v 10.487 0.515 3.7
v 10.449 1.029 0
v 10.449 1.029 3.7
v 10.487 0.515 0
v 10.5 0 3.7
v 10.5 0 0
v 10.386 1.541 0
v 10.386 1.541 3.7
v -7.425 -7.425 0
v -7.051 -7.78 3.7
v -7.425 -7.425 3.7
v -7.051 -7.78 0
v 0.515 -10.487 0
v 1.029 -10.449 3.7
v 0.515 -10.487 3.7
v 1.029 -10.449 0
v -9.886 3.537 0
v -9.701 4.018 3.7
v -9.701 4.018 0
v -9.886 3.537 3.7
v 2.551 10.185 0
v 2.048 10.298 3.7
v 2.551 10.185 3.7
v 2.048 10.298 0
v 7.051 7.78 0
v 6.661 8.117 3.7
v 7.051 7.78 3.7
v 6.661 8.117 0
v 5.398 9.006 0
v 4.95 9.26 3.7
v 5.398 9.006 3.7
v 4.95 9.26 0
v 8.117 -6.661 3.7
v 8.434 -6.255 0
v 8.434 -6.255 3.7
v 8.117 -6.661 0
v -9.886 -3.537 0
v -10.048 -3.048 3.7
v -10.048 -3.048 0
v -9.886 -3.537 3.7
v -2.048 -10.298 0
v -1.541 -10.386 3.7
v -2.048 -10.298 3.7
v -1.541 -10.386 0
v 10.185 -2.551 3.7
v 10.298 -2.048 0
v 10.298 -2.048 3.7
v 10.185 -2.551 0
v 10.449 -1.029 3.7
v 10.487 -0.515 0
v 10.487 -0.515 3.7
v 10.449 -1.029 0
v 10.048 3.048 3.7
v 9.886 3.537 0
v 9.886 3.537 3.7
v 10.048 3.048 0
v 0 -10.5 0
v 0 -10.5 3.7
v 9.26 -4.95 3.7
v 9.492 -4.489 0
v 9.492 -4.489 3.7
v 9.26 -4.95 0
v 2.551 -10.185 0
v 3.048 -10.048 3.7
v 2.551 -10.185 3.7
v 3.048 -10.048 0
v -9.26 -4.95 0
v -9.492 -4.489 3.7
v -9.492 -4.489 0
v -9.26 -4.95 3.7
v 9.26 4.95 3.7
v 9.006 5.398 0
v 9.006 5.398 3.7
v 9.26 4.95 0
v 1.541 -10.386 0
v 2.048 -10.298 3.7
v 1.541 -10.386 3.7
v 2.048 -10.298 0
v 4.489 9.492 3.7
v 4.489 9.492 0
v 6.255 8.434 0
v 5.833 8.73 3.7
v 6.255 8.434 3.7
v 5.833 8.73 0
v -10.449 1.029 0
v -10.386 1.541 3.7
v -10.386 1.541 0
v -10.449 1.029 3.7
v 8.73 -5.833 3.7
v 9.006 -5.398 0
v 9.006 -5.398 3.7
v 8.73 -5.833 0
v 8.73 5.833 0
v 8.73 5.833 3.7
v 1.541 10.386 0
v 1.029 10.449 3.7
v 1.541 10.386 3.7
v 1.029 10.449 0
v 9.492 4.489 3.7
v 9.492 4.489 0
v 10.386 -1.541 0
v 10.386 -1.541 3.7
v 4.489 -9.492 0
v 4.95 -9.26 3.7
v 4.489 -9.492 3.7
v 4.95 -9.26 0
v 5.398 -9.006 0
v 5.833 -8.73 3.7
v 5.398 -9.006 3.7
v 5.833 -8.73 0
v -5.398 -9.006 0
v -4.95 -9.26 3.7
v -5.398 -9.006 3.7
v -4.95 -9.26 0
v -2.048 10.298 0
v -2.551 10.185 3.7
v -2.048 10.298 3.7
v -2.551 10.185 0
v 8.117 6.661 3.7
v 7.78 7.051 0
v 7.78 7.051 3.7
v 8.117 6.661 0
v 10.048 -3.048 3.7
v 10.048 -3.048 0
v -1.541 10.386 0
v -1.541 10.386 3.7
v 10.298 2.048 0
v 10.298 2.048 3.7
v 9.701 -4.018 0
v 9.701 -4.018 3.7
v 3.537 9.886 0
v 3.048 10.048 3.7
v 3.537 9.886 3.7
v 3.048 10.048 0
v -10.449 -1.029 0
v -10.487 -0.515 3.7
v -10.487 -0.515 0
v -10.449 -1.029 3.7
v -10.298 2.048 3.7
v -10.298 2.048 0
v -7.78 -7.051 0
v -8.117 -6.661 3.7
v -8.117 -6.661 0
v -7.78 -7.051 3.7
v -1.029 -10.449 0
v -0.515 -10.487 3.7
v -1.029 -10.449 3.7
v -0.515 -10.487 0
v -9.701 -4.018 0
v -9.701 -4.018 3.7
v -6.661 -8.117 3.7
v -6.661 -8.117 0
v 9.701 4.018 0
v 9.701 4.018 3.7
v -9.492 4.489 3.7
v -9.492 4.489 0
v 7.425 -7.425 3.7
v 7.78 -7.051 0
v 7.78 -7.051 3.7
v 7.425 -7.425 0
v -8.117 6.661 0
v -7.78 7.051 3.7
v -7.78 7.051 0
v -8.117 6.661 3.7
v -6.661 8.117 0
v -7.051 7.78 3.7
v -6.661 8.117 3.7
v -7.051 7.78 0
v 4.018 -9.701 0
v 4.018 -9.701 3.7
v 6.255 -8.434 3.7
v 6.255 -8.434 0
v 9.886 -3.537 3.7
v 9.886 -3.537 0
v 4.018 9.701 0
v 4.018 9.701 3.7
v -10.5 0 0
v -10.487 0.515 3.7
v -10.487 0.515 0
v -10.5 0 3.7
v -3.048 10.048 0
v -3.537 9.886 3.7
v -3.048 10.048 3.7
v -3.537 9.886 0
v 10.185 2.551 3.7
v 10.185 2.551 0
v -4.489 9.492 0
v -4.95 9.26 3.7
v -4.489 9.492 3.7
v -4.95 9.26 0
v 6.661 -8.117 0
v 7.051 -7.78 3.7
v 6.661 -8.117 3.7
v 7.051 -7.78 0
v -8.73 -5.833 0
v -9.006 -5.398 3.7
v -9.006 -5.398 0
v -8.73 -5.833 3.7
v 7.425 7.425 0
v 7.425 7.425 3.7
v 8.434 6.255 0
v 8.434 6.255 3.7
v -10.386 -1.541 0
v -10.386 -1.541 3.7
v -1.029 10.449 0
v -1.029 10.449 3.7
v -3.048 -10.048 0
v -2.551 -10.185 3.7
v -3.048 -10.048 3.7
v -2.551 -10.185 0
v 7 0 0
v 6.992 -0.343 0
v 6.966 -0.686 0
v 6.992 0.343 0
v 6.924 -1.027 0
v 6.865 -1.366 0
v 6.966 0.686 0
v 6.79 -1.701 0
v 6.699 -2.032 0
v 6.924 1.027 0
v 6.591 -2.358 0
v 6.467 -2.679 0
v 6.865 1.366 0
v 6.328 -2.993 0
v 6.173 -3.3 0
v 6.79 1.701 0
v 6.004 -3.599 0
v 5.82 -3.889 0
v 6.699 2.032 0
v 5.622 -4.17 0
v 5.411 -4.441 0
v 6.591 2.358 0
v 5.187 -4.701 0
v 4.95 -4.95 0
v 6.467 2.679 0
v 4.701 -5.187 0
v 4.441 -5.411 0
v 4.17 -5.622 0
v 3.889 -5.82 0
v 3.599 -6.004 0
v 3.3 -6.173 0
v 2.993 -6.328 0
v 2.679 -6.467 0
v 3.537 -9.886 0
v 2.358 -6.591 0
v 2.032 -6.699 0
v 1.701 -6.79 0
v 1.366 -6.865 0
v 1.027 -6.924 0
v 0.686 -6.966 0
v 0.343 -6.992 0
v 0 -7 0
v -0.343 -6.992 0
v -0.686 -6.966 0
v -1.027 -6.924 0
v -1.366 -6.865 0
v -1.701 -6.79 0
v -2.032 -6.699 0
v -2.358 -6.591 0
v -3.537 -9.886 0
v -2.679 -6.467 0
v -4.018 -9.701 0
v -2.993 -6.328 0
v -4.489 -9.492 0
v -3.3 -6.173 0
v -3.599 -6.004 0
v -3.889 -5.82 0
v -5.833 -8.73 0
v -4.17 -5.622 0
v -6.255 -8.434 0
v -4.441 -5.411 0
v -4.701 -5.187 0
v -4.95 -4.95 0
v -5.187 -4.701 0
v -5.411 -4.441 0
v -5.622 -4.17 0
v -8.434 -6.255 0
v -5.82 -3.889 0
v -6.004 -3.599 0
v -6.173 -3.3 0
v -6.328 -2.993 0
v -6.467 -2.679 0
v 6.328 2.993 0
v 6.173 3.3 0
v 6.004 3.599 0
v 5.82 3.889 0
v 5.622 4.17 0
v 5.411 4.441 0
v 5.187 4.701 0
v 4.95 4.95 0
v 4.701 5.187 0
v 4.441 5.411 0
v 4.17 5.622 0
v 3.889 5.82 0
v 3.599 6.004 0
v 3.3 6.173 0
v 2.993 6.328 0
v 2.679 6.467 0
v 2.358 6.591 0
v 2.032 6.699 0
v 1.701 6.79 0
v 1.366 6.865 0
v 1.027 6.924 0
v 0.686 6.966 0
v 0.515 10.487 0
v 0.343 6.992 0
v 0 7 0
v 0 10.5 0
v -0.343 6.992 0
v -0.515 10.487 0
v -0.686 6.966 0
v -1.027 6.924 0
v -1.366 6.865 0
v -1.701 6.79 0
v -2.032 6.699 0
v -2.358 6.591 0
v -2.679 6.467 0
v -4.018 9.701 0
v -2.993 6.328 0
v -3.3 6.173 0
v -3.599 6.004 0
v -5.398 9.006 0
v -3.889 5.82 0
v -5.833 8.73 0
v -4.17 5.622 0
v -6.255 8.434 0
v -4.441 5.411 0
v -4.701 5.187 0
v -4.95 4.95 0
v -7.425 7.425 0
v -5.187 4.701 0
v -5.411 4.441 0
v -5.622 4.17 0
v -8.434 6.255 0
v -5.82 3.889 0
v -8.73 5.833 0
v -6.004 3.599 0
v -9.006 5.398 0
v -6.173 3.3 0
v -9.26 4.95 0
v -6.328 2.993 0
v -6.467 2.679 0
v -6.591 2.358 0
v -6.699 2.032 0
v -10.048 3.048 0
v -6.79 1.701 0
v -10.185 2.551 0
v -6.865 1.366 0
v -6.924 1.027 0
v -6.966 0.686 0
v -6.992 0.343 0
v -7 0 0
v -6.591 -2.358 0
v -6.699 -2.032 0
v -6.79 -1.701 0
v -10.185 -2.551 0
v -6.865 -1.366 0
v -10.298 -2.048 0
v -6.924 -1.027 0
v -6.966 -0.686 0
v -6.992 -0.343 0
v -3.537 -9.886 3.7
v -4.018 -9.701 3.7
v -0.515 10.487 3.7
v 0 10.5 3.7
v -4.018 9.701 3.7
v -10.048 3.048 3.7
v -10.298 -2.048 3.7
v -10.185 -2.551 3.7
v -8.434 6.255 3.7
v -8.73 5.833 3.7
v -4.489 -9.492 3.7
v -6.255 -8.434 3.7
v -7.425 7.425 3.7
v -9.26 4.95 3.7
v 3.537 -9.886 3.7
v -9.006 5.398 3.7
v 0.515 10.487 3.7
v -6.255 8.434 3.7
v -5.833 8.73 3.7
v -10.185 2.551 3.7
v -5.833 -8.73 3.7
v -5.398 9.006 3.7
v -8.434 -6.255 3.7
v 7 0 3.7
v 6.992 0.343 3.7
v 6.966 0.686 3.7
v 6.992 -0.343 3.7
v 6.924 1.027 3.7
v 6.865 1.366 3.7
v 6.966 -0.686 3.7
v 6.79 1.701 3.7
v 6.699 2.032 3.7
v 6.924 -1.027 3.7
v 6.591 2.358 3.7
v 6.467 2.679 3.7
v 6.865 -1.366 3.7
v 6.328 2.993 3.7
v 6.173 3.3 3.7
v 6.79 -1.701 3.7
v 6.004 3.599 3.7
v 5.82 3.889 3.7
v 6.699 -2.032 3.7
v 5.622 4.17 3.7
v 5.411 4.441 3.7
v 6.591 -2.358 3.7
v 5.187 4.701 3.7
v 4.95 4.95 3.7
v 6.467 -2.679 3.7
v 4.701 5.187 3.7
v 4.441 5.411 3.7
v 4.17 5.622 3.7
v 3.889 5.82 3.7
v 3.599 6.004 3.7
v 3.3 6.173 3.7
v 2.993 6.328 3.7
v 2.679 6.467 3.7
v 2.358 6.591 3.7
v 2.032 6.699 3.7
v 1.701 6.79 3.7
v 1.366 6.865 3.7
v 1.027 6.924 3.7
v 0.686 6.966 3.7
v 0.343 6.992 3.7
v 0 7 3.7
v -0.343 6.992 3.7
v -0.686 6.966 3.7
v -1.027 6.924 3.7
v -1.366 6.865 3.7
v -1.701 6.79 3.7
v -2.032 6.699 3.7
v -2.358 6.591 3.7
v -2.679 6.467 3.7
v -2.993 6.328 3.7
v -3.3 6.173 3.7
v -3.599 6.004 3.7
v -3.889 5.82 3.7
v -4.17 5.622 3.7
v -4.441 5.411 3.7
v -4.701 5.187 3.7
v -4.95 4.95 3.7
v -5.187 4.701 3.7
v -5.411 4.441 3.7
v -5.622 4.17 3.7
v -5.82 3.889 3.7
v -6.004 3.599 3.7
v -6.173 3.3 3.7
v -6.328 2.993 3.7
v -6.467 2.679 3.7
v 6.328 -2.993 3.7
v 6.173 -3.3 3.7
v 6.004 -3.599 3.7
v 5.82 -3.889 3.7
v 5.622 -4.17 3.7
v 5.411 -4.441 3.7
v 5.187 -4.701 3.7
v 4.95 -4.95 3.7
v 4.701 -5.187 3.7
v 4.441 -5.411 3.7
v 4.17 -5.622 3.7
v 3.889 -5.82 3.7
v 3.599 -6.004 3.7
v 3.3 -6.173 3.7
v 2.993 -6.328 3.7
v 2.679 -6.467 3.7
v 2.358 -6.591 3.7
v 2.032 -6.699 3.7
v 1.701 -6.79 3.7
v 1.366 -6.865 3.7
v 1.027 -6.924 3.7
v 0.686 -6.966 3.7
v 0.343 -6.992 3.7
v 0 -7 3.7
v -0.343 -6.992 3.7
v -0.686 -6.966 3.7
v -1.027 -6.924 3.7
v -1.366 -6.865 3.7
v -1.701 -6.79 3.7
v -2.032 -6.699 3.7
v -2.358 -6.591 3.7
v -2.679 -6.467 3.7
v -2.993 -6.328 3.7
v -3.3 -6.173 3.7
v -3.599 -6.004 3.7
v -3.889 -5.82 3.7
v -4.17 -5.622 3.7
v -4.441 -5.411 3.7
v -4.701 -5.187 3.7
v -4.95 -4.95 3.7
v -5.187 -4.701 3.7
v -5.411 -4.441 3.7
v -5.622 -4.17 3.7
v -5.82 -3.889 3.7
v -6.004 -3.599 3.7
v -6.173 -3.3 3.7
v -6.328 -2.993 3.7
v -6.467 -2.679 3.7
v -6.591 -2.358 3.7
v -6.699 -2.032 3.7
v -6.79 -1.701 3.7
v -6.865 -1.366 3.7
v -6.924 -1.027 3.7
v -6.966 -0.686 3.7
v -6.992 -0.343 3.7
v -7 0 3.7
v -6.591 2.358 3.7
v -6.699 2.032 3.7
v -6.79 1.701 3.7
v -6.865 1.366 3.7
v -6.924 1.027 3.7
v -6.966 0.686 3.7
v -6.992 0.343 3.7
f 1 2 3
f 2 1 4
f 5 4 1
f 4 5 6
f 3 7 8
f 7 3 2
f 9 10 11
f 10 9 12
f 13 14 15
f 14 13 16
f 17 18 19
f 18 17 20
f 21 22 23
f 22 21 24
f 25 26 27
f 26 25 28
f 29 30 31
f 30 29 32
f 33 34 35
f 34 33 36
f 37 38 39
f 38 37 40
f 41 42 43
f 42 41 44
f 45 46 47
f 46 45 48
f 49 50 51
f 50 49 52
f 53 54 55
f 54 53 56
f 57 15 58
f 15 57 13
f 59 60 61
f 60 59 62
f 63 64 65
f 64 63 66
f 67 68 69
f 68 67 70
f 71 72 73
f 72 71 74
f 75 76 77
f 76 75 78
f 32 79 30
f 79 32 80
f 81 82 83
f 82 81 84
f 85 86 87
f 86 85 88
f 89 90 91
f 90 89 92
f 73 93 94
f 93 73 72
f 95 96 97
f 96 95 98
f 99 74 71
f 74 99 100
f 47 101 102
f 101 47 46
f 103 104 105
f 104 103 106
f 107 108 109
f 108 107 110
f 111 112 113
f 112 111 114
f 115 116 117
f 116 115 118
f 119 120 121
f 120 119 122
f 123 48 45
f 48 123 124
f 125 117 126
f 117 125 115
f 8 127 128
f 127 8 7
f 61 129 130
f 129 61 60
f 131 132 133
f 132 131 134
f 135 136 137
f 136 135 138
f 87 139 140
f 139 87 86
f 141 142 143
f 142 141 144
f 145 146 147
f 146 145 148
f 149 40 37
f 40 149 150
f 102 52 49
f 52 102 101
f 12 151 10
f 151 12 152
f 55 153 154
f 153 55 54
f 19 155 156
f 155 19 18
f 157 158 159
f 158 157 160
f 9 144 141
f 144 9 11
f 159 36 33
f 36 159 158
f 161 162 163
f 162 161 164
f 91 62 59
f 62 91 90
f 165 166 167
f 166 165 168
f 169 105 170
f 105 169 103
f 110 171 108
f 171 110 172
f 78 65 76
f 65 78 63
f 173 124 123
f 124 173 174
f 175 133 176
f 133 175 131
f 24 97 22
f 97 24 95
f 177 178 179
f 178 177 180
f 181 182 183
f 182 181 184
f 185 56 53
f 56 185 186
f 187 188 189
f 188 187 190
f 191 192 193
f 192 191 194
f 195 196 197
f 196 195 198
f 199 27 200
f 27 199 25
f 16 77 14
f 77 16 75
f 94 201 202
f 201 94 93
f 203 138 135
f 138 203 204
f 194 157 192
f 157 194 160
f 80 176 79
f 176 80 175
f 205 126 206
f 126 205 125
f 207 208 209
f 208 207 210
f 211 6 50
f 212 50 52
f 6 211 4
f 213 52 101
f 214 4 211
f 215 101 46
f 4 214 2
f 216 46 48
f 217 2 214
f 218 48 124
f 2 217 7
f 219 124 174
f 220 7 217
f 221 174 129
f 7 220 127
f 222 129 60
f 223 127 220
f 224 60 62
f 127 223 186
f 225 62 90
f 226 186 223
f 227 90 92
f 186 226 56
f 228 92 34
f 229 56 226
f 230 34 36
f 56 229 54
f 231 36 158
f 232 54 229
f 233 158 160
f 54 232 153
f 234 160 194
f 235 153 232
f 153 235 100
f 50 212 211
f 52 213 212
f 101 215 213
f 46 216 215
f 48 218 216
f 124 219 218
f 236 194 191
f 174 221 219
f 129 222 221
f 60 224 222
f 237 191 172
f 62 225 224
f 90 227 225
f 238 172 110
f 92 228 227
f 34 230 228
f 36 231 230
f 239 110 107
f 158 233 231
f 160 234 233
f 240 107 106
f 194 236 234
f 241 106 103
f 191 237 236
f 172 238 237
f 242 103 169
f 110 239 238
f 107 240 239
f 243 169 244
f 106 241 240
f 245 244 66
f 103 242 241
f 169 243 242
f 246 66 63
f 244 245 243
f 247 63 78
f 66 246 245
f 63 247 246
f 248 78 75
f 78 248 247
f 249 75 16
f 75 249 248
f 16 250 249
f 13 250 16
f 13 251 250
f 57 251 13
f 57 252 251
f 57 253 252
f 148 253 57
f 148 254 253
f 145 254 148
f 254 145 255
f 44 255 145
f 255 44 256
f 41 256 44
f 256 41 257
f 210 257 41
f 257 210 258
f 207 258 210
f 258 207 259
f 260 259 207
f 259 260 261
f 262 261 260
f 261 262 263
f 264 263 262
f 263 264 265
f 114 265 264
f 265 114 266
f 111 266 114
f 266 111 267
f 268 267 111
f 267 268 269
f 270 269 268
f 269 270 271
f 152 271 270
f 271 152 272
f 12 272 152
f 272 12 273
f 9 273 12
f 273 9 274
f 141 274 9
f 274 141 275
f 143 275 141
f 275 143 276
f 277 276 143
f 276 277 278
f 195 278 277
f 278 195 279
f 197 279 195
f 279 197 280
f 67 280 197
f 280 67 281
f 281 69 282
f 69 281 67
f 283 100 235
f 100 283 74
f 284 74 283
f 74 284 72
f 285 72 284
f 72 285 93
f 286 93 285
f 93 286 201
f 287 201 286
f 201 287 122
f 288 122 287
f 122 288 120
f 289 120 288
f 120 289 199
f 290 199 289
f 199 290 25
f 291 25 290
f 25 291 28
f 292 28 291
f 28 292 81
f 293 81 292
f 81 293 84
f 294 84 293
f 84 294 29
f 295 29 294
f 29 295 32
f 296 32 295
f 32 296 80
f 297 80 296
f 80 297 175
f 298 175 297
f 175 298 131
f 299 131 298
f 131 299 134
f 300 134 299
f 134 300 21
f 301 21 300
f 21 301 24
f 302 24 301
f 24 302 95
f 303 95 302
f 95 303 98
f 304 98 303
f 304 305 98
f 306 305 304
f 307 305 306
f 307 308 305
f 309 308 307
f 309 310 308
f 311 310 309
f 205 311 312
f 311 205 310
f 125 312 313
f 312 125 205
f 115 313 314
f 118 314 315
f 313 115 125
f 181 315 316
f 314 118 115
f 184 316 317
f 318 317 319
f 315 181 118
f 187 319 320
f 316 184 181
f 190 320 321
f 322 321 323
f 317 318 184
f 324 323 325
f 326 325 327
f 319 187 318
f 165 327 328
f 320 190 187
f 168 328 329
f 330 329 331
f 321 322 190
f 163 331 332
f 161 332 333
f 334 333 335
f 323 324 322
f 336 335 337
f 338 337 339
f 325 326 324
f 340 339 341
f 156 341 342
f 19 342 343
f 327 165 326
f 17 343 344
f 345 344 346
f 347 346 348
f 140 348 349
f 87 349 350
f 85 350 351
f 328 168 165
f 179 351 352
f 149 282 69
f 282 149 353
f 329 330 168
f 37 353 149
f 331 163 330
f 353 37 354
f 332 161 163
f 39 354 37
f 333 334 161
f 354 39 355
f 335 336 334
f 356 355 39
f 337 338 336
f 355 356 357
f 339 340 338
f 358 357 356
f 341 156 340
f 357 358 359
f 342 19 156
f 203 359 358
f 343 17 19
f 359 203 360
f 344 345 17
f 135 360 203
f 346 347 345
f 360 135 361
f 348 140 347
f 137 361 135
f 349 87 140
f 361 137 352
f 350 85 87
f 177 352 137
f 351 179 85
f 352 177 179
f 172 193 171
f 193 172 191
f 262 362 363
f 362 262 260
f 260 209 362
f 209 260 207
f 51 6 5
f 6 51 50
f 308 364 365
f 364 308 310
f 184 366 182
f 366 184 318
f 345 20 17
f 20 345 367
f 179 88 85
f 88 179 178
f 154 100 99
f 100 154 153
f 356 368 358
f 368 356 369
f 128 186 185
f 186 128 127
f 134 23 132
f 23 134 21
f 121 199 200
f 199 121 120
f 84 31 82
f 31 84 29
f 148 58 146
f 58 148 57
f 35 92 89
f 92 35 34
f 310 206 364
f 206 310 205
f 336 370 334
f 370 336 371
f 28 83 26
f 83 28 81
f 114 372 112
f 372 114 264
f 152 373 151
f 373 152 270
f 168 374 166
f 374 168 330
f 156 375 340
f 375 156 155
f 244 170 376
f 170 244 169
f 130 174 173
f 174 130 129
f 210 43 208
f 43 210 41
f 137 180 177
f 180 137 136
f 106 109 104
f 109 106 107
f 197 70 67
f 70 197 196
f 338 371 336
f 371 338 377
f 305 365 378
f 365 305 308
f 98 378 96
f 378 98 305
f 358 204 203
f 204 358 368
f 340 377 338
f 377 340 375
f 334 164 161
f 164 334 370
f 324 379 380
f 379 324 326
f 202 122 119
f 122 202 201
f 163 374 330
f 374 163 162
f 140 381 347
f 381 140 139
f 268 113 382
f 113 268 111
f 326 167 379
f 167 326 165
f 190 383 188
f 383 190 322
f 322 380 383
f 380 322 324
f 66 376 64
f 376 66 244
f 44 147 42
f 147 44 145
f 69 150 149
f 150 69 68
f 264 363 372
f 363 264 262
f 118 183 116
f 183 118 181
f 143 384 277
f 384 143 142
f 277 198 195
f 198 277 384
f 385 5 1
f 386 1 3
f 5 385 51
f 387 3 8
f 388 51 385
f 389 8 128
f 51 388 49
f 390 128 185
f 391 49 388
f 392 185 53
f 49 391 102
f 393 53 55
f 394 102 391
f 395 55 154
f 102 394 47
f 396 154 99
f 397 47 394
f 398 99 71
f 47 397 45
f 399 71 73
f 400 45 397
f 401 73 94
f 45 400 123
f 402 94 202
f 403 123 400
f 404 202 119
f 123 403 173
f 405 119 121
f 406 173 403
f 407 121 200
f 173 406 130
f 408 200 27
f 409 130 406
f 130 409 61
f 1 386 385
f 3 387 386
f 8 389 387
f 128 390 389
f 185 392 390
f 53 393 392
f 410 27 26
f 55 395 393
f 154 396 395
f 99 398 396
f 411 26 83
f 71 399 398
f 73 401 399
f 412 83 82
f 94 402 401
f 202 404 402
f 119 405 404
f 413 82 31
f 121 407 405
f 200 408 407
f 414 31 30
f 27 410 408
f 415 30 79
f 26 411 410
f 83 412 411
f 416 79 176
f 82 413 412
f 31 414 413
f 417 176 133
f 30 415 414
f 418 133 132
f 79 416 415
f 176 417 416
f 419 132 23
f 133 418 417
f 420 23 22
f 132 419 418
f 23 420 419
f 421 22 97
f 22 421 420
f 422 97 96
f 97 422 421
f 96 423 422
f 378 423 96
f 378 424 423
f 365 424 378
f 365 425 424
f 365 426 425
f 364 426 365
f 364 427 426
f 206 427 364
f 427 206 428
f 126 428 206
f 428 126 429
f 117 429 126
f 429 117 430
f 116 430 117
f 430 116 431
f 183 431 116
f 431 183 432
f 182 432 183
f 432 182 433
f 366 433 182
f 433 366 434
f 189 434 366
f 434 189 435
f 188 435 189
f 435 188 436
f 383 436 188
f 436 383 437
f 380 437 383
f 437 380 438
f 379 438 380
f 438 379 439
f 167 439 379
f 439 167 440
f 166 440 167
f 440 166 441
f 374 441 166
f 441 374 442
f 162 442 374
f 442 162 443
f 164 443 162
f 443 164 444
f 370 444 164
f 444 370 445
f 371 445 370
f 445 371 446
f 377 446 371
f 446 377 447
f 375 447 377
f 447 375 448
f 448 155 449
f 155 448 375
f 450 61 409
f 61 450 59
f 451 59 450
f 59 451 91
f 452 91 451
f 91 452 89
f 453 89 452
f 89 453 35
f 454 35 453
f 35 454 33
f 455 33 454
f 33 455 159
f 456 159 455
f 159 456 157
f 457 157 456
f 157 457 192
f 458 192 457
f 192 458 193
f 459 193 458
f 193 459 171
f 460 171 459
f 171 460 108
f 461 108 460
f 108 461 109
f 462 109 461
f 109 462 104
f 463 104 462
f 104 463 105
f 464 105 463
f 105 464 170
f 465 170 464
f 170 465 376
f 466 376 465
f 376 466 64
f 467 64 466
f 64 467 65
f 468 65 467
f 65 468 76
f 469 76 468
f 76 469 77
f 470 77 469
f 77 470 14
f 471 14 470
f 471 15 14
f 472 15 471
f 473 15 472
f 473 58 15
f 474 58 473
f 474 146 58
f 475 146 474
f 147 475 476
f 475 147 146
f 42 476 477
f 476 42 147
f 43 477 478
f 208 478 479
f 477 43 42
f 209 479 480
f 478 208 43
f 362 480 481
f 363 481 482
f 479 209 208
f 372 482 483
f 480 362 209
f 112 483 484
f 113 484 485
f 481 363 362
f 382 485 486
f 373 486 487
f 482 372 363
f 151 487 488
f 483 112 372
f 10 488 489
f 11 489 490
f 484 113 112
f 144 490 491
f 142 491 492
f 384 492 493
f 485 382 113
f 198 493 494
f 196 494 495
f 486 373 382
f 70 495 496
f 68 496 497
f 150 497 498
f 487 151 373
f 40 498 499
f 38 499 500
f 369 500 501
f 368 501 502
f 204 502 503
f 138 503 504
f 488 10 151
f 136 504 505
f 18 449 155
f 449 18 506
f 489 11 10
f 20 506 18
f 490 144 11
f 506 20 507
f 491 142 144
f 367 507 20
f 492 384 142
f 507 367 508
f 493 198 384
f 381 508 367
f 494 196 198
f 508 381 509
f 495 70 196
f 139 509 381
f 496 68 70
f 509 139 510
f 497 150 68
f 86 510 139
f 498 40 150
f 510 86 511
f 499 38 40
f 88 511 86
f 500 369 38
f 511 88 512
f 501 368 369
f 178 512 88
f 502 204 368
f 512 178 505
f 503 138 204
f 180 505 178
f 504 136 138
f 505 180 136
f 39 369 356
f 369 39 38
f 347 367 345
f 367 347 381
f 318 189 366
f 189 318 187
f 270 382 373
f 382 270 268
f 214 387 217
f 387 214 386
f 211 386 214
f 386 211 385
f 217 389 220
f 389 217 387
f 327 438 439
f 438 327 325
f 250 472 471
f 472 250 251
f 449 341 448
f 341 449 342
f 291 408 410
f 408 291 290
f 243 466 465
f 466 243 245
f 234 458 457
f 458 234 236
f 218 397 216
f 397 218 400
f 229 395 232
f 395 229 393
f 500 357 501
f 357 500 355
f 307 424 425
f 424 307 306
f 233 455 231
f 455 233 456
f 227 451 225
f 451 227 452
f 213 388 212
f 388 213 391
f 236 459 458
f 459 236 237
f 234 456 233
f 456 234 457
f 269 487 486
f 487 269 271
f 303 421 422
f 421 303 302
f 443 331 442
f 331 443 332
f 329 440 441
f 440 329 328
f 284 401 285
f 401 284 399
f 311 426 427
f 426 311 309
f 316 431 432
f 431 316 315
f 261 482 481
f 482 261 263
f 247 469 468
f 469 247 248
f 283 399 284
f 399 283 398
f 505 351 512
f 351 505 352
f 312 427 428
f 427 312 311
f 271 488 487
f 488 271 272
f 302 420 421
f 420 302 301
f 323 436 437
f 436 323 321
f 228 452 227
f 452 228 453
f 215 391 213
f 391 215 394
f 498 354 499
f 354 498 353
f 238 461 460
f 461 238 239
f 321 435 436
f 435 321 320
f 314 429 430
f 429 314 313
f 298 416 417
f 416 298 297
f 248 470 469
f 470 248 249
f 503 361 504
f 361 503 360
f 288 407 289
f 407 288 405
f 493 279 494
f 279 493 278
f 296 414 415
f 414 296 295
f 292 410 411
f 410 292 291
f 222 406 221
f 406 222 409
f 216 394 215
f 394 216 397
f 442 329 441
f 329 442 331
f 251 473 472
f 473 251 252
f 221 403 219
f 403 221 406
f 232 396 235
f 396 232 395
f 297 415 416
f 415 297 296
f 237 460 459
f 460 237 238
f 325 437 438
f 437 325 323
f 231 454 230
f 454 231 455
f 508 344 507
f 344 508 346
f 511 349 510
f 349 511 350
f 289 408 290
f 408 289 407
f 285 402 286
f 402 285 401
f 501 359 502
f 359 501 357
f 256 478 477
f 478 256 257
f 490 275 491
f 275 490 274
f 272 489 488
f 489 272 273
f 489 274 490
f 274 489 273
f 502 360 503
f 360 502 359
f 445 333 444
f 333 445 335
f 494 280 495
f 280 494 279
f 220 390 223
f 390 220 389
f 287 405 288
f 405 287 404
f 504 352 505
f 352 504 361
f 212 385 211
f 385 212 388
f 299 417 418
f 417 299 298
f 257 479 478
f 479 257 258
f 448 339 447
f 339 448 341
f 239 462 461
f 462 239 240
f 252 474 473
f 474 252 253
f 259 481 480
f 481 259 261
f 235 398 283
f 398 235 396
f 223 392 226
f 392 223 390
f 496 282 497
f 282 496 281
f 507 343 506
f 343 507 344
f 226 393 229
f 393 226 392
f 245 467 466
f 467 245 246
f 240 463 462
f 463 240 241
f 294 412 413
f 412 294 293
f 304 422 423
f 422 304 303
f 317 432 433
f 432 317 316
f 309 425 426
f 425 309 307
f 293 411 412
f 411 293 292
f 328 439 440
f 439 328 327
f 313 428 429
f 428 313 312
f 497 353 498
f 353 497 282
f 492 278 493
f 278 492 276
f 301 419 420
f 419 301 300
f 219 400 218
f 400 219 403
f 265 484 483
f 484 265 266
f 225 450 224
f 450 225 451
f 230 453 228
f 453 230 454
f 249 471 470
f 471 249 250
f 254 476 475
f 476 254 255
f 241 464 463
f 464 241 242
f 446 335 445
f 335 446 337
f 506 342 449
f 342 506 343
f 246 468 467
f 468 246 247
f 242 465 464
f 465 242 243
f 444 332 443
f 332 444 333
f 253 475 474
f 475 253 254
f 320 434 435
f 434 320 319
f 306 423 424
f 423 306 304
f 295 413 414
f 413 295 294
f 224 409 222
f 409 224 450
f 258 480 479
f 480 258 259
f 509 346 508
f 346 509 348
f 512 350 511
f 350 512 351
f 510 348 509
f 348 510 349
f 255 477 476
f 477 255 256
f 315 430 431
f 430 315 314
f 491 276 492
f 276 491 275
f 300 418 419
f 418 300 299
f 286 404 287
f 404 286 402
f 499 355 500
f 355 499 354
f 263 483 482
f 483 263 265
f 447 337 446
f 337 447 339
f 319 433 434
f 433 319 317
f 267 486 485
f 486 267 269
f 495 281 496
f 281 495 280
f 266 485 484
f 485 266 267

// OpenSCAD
$fn = 128;

r = 10.5;
h = 3.7;
t = 3.5;

difference() {
  cylinder(h = h, r = r);
  translate([0, 0, -0.01])
    cylinder(h = h + 0.02, r = max(0, r - t));
}
